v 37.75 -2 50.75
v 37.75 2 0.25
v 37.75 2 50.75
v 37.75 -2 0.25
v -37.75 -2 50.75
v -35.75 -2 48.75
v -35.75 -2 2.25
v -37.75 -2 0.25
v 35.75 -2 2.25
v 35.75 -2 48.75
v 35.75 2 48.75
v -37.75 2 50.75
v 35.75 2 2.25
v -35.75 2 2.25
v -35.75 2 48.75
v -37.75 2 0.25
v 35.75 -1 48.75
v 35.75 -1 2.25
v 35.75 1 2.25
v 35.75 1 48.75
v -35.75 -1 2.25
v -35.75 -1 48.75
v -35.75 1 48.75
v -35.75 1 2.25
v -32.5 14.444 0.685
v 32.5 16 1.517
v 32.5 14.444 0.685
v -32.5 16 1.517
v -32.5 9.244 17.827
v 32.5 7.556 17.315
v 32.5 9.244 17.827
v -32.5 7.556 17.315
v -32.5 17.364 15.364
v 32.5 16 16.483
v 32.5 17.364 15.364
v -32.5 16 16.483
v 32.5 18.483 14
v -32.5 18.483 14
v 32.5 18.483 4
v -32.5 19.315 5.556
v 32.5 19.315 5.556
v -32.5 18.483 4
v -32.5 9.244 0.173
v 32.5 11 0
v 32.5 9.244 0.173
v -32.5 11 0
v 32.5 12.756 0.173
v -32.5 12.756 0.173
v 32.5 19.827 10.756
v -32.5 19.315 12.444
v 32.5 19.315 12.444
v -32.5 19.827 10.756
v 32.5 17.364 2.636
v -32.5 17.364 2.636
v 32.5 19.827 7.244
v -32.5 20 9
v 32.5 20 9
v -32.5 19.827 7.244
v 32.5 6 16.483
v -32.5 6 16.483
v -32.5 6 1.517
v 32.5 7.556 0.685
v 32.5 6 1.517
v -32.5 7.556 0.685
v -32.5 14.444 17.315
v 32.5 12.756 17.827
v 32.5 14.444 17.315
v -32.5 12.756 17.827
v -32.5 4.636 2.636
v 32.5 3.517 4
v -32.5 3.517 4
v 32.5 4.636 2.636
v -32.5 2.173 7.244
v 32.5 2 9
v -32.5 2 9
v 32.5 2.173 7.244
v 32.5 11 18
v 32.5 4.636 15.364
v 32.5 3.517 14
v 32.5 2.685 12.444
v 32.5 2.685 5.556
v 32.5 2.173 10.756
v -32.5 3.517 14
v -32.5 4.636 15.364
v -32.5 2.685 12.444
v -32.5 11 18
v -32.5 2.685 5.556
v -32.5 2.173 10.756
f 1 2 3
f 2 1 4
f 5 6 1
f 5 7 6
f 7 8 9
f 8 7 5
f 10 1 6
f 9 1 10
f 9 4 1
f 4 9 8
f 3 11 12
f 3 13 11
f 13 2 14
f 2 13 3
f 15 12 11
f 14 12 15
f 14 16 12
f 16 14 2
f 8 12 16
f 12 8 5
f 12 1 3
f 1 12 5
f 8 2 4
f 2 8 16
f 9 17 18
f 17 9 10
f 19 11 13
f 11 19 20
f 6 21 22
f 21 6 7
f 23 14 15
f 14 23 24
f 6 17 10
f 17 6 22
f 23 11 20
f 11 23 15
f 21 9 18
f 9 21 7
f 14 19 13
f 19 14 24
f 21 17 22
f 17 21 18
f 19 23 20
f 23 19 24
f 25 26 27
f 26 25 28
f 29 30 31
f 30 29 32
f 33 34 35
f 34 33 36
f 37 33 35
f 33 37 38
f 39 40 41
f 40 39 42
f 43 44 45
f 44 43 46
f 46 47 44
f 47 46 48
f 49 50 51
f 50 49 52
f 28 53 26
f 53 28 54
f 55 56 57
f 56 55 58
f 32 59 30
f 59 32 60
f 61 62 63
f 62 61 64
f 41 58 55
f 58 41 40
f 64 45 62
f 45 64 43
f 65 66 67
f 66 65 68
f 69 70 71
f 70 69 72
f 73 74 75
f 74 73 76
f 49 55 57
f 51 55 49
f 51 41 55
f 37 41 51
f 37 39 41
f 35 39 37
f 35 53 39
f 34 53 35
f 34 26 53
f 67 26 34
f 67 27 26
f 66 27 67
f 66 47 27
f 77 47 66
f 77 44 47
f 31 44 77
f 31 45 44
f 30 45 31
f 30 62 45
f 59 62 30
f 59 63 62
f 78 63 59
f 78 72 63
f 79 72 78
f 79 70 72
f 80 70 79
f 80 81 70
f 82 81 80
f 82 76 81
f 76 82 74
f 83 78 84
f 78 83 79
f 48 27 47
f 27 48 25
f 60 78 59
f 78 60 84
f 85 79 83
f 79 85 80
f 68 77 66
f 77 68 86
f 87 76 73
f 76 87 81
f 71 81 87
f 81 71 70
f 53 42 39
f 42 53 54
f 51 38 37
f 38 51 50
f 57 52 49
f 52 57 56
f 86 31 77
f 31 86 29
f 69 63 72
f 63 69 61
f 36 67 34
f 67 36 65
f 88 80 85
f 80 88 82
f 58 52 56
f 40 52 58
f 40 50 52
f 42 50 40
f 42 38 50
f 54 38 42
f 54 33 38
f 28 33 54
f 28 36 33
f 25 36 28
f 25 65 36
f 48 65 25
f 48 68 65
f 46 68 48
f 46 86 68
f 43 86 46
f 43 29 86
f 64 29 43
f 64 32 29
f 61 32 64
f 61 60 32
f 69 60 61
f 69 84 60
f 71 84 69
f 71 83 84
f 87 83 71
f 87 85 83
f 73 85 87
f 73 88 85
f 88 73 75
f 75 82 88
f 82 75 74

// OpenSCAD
// file: akkum18650.scad
echo("Работа Полина Максимова");
d_akkum = 18;
h_akkum = 65;
akkum18650();

module akkum18650(){
    color("purple")
    cylinder(d=18,h=65, $fn=32, center=true);
}
// main file
use <akkum18650.scad>


echo("Работа Полина Максимова");
fitnes_Frame = 4;
thickness_walls =2;
thickness_bottom = 2;
h_wall = 4;

w_back = 70;
h_back = 45;
thickness_back = 1; 
gap_backlight = 1.5;

d_akkum = 18;
h_akkum = 65;
//walls();

//rotate([90, 0, 0])
//translate([0,0,1])
//backlight();
//kit_frame();
//akkum18650();

build_frame();
module build_frame(){
    translate([0,0,h_back/2+2*gap_backlight])
    rotate([90,0,0])
    kit_frame();
    translate([0,d_akkum/2+thickness_bottom,d_akkum/2])
    rotate([0,90,0])
    akkum18650();
    }

module kit_frame(){
    bottom();
    color("blue") 
    translate([0,0,h_wall/2+thickness_bottom/2]);
    walls();
}
module walls() {
difference(){
        cube([w_back+2*thickness_walls+gap_backlight, h_back+2*thickness_walls+gap_backlight,h_wall],center=true);
        color("red")
        cube([w_back+gap_backlight, h_back+gap_backlight,h_wall+1],center=true);
    }
}

module bottom(){
    cube([w_back+2*thickness_walls+gap_backlight, h_back+2*thickness_walls+gap_backlight,thickness_bottom],center=true);
    }

module backlight(){
    color("lightblue")
    cube([w_back, h_back, thickness_back], center=true);
}
